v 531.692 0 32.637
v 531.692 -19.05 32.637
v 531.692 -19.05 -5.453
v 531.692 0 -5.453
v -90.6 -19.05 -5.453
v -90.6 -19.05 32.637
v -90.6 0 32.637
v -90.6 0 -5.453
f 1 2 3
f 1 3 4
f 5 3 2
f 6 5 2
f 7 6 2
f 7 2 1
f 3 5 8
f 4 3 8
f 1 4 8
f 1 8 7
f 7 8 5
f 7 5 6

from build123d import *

# Parameters (mm, degrees)
F0_W     = 161.0525511205
F0_H     = 48.0719506741
F1_DEPTH = 19.05
F2_W     = 19.05
F2_H     = 48.0719506741
F3_DEPTH = 622.3
F4_DEPTH = 161.0614
F5_DEPTH = 9.9822


with BuildPart() as f1:
    # F0 (on Front) → F1 (new body)
    with BuildSketch(Plane.XZ):
        with Locations((-10.0732576102, 8.6007639766)):
            Rectangle(F0_W, F0_H)
    extrude(amount=F1_DEPTH)

    # F2 (on face) → F3 (join)
    with BuildSketch(Plane.YZ.offset(70.4530179501)):
        with Locations((-9.525, 8.6007639766)):
            Rectangle(F2_W, F2_H)
    extrude(amount=F3_DEPTH)

    # F4 (cut): a face of the model
    f4_faces = [f1.faces().sort_by_distance(p)[0] for p in [
        (692.7530179501, -9.525, 8.6007639766),
    ]]
    extrude(f4_faces, amount=-F4_DEPTH, mode=Mode.SUBTRACT)

    # F5 (cut): a face of the model
    f5_faces = [f1.faces().sort_by_distance(p)[0] for p in [
        (220.5460423898, -9.525, -15.4352113605),
    ]]
    extrude(f5_faces, amount=-F5_DEPTH, mode=Mode.SUBTRACT)


solid = f1.part
